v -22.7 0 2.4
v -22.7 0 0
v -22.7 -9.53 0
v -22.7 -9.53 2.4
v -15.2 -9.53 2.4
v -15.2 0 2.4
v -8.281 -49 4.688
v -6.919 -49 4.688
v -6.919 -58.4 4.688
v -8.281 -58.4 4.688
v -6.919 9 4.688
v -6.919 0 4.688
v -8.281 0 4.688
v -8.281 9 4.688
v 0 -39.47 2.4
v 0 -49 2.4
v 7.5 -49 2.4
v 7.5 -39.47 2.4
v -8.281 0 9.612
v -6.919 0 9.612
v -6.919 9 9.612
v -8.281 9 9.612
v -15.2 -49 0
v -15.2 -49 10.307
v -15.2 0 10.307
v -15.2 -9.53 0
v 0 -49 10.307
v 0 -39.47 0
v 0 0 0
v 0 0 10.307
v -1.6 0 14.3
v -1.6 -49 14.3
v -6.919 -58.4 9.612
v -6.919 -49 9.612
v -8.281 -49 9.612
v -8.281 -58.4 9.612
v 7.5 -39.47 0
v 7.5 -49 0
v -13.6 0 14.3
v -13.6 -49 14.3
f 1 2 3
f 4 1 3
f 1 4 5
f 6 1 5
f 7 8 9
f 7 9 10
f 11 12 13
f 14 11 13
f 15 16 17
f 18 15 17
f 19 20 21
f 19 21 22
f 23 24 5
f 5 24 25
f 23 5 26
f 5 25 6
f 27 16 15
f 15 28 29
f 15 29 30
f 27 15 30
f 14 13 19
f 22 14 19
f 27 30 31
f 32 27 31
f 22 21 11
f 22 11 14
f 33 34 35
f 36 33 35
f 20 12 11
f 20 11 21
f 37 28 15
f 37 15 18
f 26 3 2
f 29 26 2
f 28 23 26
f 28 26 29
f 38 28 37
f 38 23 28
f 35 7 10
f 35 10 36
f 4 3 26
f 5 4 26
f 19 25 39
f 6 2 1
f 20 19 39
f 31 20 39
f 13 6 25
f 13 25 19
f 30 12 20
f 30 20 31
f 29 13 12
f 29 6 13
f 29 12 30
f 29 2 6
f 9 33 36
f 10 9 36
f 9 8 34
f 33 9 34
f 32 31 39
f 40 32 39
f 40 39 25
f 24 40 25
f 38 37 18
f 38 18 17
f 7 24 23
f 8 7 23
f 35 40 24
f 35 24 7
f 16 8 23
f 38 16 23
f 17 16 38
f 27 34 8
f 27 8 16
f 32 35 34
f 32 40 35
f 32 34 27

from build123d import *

# Parameters (mm, degrees)
F1_DEPTH      = 49
F2_W          = 7.5
F2_H          = 9.53
F3_DEPTH      = 2.4
F4_W          = 1.362546
F4_H          = 4.923334
F5_DEPTH      = 9
F5_DEPTH_BACK = 58.4


with BuildPart() as f1:
    # F0 (on Front) → F1 (new body)
    with BuildSketch(Plane.XZ):
        Polygon((-15.2, 0), (0, 0), (0, 2.41), (0, 10.307252), (-1.6, 14.3), (-13.6, 14.3), (-15.2, 10.307252), (-15.2, 2.41), align=None)
    extrude(amount=F1_DEPTH)

    # F2 (on face) → F3 (join)
    with BuildSketch(Plane(origin=(0, 0, 0), x_dir=(1, 0, 0), z_dir=(0, 0, -1))):
        with Locations((-18.95, 4.765)):
            Rectangle(F2_W, F2_H)
        with Locations((3.75, 44.235)):
            Rectangle(F2_W, F2_H)
    extrude(amount=-F3_DEPTH)

    # F4 (on face) → F5 (join, two sides)
    with BuildSketch(Plane(origin=(0, 0, 0), x_dir=(-1, 0, 0), z_dir=(0, 1, 0))) as f5_sk:
        with Locations((7.6, 7.15)):
            Rectangle(F4_W, F4_H)
    extrude(amount=F5_DEPTH)
    extrude(f5_sk.sketch, amount=-F5_DEPTH_BACK)


solid = f1.part
